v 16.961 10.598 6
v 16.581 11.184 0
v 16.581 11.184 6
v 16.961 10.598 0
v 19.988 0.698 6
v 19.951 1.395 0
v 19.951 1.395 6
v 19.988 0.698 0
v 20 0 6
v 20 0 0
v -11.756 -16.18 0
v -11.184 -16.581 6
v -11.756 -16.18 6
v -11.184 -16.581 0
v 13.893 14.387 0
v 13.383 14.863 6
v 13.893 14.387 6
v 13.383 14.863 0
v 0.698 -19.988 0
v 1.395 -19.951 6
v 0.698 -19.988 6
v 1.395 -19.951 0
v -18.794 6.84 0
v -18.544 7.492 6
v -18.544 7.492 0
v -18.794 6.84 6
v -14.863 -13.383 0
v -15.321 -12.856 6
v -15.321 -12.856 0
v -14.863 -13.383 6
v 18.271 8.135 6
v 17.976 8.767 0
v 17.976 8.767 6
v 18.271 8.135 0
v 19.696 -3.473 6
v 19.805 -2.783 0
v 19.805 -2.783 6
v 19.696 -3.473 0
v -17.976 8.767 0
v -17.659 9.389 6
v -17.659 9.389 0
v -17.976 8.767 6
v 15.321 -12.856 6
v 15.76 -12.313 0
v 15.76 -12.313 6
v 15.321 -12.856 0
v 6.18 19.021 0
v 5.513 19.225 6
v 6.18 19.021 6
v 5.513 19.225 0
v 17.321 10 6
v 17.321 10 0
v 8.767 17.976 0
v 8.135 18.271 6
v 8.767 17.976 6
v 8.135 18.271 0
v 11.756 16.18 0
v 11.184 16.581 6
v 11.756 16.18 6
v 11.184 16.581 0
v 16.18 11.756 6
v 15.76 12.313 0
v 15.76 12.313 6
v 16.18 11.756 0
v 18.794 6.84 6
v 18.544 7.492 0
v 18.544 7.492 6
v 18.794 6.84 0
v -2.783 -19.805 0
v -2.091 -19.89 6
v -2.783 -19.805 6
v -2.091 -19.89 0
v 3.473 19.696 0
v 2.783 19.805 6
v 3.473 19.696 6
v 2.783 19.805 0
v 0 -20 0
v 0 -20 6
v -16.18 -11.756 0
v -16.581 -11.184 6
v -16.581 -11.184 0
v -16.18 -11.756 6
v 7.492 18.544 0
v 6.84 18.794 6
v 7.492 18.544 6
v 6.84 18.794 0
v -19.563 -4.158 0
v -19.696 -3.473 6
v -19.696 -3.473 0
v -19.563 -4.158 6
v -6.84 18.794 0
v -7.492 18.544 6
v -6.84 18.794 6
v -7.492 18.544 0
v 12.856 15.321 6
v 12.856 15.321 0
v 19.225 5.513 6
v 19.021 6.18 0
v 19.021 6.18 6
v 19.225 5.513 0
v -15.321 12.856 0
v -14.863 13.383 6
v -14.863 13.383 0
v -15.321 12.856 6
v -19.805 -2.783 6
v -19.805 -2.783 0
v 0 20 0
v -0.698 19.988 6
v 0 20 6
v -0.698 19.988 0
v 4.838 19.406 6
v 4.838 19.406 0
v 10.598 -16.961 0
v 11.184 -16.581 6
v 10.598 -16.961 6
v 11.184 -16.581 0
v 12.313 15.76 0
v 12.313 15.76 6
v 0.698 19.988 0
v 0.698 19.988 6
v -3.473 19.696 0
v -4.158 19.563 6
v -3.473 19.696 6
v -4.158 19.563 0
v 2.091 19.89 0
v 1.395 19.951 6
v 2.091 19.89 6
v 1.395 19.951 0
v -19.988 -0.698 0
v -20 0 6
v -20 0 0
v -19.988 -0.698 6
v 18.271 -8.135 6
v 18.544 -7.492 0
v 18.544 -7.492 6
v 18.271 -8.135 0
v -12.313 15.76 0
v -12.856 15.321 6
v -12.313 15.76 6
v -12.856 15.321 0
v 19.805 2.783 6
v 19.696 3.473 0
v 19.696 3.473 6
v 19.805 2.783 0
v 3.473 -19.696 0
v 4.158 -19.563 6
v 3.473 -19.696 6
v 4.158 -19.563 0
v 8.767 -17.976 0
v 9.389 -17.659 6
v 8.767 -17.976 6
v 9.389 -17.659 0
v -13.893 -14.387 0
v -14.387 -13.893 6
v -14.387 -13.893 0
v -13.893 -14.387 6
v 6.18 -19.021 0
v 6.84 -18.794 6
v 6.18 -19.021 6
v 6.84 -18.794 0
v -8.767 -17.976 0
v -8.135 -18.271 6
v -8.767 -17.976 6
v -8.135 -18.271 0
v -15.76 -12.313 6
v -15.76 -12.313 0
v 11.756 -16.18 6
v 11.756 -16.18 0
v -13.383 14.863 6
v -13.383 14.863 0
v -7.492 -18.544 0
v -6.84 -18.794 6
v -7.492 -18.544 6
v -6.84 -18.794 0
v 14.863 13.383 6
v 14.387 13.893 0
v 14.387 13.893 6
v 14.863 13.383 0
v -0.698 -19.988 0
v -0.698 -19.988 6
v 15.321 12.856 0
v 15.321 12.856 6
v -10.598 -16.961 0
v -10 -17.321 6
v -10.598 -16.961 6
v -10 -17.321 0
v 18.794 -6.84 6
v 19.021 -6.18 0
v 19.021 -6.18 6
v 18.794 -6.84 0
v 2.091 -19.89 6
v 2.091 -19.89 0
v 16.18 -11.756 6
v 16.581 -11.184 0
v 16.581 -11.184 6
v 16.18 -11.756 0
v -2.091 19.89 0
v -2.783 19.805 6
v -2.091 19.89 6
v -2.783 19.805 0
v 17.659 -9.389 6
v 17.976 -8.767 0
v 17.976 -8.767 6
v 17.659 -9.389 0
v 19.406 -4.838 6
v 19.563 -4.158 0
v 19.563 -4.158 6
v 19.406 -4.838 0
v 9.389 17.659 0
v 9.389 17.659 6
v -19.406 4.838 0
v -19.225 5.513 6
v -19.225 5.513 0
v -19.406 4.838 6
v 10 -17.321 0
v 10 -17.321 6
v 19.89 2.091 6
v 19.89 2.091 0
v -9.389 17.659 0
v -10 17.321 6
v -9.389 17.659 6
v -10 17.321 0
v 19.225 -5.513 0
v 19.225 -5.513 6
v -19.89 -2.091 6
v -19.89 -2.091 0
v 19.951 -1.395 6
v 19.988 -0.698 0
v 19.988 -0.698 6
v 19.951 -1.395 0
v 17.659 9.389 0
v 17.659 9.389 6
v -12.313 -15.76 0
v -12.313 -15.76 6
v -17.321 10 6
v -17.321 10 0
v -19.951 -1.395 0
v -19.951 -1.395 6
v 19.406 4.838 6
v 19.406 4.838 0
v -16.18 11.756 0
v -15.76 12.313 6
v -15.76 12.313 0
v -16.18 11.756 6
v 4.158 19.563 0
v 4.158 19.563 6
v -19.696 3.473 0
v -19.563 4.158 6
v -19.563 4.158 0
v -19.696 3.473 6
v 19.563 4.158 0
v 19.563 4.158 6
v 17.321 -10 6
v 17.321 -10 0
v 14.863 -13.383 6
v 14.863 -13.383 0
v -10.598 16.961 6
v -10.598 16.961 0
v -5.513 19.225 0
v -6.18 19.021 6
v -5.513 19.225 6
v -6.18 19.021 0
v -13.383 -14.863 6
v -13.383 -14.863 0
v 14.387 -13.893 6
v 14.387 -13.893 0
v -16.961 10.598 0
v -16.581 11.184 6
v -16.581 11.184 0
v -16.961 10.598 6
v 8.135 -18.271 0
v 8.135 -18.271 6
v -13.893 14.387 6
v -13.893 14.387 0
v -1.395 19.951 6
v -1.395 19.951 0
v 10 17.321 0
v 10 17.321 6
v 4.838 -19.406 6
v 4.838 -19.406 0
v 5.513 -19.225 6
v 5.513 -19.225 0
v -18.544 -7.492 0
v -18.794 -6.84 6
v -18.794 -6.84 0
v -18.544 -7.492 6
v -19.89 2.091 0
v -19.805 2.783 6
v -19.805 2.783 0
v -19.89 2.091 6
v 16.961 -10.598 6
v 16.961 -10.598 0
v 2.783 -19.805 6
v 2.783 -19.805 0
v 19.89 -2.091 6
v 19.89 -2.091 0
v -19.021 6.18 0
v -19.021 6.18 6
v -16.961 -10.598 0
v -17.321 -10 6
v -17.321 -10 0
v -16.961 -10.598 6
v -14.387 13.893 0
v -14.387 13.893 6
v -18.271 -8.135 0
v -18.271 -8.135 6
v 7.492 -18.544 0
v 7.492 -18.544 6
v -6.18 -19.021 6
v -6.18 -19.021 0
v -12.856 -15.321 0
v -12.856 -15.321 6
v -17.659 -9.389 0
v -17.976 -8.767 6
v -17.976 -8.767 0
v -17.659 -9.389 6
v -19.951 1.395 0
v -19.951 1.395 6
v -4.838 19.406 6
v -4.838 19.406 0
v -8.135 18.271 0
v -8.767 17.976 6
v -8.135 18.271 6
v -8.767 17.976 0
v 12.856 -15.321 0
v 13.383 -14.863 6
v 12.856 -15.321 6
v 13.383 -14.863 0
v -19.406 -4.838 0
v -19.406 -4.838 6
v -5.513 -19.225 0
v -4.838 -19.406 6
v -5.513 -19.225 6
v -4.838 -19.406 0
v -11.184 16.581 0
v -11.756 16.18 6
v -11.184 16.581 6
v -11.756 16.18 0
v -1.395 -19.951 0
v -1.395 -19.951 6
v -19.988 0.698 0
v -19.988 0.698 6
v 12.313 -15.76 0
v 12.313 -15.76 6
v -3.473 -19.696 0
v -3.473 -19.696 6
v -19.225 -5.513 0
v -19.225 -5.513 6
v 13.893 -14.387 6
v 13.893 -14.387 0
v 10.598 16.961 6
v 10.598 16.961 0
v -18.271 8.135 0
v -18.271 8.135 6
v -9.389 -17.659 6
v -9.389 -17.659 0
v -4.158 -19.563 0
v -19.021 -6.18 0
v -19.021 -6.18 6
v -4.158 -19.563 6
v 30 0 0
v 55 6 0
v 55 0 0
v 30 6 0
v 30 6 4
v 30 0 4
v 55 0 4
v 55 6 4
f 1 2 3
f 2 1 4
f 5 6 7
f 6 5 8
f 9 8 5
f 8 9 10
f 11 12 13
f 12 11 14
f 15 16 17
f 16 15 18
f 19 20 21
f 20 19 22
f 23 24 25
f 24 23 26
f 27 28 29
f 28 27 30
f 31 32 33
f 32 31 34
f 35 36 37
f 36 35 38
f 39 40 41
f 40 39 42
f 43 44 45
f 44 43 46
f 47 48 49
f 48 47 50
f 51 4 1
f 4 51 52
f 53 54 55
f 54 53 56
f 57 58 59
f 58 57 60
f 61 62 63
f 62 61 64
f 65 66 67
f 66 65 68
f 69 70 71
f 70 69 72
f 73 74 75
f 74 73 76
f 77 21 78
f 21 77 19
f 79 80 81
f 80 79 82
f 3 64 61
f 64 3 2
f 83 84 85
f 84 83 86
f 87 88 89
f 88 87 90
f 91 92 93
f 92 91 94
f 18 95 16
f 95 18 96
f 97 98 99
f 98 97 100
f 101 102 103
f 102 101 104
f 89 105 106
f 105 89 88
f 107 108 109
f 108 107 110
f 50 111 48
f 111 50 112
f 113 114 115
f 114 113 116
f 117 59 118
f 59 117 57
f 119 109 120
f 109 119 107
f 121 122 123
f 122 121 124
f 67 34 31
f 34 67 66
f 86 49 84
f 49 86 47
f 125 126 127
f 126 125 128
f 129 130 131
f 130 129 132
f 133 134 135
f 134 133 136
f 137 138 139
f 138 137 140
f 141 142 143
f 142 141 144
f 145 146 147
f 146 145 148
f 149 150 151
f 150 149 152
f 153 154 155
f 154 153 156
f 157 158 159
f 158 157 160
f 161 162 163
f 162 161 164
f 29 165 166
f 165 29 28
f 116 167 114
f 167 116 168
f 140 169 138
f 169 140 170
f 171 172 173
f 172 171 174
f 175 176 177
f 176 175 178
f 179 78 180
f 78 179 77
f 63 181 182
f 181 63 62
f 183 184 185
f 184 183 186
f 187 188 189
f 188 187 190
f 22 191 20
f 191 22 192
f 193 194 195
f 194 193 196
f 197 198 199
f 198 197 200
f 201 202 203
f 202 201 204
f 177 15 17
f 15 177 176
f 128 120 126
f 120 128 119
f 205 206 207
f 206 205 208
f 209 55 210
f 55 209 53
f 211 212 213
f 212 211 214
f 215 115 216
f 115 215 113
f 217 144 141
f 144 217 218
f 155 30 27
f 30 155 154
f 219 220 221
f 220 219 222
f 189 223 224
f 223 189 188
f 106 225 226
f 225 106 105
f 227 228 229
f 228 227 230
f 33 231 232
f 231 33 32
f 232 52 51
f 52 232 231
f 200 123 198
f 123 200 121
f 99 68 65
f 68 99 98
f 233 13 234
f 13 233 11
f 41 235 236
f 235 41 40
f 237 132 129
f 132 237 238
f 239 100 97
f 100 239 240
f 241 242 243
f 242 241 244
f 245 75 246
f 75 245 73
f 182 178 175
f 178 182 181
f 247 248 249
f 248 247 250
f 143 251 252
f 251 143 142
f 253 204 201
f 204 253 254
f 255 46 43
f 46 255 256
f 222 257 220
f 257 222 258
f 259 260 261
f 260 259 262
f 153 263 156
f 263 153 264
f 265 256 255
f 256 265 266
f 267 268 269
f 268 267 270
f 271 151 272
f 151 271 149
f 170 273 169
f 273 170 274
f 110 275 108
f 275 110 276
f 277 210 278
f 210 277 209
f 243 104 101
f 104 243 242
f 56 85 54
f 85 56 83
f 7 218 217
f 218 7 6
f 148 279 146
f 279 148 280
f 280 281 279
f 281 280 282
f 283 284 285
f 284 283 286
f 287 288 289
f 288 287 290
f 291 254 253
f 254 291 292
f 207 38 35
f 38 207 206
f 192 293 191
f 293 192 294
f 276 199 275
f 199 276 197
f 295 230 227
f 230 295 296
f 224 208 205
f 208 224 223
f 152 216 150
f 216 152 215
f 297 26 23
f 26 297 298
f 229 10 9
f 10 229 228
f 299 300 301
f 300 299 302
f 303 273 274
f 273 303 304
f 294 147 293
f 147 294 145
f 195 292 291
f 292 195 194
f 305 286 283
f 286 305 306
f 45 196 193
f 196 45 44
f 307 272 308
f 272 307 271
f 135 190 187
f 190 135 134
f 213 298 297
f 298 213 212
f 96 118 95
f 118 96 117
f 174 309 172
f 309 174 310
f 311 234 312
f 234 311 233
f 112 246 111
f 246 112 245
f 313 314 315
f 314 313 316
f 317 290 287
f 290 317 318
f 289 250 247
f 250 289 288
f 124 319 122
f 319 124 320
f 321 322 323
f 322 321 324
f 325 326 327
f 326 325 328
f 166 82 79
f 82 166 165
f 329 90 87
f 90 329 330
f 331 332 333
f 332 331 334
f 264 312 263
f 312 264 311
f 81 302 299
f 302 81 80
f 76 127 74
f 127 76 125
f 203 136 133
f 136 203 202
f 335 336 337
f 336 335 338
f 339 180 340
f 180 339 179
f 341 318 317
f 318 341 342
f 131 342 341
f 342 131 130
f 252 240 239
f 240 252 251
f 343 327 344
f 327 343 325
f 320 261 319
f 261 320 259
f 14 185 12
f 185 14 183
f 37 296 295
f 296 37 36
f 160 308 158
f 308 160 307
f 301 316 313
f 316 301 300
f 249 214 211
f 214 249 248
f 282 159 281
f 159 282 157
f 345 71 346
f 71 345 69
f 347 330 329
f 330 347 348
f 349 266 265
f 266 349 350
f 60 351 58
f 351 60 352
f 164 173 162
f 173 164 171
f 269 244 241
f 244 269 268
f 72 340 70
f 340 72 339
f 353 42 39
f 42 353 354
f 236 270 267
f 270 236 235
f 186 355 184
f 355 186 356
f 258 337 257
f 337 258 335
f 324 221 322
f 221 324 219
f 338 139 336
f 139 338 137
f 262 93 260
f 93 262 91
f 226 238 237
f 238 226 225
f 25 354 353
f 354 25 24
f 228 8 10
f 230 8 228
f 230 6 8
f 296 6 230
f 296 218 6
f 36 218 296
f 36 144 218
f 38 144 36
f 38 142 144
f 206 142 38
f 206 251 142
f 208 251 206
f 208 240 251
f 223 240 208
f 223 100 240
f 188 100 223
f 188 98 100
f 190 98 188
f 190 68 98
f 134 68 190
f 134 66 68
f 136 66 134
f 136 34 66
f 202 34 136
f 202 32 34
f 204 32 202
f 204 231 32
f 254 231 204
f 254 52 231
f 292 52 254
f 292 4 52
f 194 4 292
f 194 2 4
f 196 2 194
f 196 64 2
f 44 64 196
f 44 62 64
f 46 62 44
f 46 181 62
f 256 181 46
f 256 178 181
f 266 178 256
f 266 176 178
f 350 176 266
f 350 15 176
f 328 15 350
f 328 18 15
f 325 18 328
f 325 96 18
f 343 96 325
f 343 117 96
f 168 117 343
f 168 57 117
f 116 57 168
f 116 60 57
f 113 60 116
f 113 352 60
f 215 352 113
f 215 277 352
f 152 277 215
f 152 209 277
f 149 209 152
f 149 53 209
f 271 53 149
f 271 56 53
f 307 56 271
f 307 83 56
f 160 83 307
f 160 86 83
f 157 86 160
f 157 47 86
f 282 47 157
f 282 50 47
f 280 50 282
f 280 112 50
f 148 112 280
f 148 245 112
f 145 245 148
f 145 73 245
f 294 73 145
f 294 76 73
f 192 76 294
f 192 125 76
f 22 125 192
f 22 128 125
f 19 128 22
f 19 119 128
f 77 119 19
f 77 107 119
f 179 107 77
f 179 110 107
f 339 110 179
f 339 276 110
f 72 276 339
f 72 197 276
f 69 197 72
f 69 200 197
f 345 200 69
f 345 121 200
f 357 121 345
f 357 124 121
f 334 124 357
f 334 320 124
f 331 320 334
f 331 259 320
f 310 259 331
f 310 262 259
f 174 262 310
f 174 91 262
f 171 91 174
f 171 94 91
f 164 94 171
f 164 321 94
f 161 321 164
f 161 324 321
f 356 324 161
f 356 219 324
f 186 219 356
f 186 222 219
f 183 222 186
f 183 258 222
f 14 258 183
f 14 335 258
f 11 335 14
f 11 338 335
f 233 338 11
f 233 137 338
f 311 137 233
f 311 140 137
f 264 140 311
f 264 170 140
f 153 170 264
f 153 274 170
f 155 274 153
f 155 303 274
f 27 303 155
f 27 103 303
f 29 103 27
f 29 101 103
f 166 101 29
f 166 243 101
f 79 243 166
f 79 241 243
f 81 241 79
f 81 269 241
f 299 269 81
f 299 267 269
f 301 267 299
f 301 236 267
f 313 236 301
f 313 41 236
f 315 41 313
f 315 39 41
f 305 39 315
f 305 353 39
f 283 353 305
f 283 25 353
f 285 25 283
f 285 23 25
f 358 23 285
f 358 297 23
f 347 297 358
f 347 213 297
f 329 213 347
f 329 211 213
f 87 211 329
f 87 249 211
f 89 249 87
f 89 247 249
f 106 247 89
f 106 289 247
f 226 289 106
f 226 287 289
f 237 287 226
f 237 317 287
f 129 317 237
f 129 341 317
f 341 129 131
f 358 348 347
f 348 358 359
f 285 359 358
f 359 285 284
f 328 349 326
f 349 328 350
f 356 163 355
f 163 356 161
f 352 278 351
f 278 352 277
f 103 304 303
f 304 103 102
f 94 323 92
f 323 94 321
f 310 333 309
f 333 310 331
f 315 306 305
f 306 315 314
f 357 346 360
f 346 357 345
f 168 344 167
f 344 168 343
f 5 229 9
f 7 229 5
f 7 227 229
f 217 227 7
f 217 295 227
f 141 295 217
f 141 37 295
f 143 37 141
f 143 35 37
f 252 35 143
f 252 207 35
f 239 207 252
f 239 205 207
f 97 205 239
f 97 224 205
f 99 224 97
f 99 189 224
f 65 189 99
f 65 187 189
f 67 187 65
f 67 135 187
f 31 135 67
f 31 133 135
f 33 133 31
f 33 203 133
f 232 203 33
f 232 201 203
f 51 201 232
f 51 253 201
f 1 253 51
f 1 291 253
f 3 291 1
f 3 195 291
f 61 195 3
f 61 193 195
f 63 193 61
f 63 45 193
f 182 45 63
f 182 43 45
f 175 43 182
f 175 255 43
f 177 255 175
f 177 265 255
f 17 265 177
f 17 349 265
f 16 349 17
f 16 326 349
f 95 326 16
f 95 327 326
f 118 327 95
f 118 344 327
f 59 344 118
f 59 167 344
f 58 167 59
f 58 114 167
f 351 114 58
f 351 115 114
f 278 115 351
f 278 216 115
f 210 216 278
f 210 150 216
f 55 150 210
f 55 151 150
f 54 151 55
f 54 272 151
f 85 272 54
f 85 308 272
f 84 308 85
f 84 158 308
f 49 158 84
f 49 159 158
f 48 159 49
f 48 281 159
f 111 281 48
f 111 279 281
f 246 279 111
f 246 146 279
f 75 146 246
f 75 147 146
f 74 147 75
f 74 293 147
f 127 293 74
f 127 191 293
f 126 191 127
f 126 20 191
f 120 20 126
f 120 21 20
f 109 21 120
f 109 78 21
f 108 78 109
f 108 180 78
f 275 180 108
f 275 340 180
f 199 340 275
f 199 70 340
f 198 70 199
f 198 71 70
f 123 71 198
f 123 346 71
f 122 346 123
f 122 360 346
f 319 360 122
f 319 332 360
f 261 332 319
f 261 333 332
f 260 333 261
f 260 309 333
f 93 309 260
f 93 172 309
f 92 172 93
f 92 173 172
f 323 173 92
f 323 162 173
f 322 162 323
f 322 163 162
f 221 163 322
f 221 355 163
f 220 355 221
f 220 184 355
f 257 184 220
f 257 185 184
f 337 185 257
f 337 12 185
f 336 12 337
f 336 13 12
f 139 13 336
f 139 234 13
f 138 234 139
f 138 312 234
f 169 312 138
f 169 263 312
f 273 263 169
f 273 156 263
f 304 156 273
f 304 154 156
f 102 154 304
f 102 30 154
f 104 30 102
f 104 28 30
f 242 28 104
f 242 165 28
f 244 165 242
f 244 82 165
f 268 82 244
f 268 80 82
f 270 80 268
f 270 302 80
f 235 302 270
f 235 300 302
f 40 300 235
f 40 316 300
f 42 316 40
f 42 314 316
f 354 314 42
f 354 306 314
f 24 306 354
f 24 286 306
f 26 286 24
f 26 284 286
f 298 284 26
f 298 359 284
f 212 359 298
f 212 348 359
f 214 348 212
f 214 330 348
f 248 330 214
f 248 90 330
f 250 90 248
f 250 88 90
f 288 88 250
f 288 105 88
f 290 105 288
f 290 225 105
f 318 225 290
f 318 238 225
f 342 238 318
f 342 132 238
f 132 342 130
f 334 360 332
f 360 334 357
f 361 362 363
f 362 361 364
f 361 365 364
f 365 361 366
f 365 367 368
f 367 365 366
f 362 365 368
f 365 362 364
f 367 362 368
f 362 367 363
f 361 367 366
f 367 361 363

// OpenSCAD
/*
  Ratchet & pawl (demonstrator blank).
*/
teeth = 12;
radius = 20;
thickness = 6;
pawl_len = 25;
pawl_th = 4;
$fn=180;

module wheel(){ cylinder(h=thickness, r=radius); }
module pawl(){ linear_extrude(height=pawl_th) square([pawl_len, 6]); }

wheel();
translate([radius+10,0,0]) pawl();
